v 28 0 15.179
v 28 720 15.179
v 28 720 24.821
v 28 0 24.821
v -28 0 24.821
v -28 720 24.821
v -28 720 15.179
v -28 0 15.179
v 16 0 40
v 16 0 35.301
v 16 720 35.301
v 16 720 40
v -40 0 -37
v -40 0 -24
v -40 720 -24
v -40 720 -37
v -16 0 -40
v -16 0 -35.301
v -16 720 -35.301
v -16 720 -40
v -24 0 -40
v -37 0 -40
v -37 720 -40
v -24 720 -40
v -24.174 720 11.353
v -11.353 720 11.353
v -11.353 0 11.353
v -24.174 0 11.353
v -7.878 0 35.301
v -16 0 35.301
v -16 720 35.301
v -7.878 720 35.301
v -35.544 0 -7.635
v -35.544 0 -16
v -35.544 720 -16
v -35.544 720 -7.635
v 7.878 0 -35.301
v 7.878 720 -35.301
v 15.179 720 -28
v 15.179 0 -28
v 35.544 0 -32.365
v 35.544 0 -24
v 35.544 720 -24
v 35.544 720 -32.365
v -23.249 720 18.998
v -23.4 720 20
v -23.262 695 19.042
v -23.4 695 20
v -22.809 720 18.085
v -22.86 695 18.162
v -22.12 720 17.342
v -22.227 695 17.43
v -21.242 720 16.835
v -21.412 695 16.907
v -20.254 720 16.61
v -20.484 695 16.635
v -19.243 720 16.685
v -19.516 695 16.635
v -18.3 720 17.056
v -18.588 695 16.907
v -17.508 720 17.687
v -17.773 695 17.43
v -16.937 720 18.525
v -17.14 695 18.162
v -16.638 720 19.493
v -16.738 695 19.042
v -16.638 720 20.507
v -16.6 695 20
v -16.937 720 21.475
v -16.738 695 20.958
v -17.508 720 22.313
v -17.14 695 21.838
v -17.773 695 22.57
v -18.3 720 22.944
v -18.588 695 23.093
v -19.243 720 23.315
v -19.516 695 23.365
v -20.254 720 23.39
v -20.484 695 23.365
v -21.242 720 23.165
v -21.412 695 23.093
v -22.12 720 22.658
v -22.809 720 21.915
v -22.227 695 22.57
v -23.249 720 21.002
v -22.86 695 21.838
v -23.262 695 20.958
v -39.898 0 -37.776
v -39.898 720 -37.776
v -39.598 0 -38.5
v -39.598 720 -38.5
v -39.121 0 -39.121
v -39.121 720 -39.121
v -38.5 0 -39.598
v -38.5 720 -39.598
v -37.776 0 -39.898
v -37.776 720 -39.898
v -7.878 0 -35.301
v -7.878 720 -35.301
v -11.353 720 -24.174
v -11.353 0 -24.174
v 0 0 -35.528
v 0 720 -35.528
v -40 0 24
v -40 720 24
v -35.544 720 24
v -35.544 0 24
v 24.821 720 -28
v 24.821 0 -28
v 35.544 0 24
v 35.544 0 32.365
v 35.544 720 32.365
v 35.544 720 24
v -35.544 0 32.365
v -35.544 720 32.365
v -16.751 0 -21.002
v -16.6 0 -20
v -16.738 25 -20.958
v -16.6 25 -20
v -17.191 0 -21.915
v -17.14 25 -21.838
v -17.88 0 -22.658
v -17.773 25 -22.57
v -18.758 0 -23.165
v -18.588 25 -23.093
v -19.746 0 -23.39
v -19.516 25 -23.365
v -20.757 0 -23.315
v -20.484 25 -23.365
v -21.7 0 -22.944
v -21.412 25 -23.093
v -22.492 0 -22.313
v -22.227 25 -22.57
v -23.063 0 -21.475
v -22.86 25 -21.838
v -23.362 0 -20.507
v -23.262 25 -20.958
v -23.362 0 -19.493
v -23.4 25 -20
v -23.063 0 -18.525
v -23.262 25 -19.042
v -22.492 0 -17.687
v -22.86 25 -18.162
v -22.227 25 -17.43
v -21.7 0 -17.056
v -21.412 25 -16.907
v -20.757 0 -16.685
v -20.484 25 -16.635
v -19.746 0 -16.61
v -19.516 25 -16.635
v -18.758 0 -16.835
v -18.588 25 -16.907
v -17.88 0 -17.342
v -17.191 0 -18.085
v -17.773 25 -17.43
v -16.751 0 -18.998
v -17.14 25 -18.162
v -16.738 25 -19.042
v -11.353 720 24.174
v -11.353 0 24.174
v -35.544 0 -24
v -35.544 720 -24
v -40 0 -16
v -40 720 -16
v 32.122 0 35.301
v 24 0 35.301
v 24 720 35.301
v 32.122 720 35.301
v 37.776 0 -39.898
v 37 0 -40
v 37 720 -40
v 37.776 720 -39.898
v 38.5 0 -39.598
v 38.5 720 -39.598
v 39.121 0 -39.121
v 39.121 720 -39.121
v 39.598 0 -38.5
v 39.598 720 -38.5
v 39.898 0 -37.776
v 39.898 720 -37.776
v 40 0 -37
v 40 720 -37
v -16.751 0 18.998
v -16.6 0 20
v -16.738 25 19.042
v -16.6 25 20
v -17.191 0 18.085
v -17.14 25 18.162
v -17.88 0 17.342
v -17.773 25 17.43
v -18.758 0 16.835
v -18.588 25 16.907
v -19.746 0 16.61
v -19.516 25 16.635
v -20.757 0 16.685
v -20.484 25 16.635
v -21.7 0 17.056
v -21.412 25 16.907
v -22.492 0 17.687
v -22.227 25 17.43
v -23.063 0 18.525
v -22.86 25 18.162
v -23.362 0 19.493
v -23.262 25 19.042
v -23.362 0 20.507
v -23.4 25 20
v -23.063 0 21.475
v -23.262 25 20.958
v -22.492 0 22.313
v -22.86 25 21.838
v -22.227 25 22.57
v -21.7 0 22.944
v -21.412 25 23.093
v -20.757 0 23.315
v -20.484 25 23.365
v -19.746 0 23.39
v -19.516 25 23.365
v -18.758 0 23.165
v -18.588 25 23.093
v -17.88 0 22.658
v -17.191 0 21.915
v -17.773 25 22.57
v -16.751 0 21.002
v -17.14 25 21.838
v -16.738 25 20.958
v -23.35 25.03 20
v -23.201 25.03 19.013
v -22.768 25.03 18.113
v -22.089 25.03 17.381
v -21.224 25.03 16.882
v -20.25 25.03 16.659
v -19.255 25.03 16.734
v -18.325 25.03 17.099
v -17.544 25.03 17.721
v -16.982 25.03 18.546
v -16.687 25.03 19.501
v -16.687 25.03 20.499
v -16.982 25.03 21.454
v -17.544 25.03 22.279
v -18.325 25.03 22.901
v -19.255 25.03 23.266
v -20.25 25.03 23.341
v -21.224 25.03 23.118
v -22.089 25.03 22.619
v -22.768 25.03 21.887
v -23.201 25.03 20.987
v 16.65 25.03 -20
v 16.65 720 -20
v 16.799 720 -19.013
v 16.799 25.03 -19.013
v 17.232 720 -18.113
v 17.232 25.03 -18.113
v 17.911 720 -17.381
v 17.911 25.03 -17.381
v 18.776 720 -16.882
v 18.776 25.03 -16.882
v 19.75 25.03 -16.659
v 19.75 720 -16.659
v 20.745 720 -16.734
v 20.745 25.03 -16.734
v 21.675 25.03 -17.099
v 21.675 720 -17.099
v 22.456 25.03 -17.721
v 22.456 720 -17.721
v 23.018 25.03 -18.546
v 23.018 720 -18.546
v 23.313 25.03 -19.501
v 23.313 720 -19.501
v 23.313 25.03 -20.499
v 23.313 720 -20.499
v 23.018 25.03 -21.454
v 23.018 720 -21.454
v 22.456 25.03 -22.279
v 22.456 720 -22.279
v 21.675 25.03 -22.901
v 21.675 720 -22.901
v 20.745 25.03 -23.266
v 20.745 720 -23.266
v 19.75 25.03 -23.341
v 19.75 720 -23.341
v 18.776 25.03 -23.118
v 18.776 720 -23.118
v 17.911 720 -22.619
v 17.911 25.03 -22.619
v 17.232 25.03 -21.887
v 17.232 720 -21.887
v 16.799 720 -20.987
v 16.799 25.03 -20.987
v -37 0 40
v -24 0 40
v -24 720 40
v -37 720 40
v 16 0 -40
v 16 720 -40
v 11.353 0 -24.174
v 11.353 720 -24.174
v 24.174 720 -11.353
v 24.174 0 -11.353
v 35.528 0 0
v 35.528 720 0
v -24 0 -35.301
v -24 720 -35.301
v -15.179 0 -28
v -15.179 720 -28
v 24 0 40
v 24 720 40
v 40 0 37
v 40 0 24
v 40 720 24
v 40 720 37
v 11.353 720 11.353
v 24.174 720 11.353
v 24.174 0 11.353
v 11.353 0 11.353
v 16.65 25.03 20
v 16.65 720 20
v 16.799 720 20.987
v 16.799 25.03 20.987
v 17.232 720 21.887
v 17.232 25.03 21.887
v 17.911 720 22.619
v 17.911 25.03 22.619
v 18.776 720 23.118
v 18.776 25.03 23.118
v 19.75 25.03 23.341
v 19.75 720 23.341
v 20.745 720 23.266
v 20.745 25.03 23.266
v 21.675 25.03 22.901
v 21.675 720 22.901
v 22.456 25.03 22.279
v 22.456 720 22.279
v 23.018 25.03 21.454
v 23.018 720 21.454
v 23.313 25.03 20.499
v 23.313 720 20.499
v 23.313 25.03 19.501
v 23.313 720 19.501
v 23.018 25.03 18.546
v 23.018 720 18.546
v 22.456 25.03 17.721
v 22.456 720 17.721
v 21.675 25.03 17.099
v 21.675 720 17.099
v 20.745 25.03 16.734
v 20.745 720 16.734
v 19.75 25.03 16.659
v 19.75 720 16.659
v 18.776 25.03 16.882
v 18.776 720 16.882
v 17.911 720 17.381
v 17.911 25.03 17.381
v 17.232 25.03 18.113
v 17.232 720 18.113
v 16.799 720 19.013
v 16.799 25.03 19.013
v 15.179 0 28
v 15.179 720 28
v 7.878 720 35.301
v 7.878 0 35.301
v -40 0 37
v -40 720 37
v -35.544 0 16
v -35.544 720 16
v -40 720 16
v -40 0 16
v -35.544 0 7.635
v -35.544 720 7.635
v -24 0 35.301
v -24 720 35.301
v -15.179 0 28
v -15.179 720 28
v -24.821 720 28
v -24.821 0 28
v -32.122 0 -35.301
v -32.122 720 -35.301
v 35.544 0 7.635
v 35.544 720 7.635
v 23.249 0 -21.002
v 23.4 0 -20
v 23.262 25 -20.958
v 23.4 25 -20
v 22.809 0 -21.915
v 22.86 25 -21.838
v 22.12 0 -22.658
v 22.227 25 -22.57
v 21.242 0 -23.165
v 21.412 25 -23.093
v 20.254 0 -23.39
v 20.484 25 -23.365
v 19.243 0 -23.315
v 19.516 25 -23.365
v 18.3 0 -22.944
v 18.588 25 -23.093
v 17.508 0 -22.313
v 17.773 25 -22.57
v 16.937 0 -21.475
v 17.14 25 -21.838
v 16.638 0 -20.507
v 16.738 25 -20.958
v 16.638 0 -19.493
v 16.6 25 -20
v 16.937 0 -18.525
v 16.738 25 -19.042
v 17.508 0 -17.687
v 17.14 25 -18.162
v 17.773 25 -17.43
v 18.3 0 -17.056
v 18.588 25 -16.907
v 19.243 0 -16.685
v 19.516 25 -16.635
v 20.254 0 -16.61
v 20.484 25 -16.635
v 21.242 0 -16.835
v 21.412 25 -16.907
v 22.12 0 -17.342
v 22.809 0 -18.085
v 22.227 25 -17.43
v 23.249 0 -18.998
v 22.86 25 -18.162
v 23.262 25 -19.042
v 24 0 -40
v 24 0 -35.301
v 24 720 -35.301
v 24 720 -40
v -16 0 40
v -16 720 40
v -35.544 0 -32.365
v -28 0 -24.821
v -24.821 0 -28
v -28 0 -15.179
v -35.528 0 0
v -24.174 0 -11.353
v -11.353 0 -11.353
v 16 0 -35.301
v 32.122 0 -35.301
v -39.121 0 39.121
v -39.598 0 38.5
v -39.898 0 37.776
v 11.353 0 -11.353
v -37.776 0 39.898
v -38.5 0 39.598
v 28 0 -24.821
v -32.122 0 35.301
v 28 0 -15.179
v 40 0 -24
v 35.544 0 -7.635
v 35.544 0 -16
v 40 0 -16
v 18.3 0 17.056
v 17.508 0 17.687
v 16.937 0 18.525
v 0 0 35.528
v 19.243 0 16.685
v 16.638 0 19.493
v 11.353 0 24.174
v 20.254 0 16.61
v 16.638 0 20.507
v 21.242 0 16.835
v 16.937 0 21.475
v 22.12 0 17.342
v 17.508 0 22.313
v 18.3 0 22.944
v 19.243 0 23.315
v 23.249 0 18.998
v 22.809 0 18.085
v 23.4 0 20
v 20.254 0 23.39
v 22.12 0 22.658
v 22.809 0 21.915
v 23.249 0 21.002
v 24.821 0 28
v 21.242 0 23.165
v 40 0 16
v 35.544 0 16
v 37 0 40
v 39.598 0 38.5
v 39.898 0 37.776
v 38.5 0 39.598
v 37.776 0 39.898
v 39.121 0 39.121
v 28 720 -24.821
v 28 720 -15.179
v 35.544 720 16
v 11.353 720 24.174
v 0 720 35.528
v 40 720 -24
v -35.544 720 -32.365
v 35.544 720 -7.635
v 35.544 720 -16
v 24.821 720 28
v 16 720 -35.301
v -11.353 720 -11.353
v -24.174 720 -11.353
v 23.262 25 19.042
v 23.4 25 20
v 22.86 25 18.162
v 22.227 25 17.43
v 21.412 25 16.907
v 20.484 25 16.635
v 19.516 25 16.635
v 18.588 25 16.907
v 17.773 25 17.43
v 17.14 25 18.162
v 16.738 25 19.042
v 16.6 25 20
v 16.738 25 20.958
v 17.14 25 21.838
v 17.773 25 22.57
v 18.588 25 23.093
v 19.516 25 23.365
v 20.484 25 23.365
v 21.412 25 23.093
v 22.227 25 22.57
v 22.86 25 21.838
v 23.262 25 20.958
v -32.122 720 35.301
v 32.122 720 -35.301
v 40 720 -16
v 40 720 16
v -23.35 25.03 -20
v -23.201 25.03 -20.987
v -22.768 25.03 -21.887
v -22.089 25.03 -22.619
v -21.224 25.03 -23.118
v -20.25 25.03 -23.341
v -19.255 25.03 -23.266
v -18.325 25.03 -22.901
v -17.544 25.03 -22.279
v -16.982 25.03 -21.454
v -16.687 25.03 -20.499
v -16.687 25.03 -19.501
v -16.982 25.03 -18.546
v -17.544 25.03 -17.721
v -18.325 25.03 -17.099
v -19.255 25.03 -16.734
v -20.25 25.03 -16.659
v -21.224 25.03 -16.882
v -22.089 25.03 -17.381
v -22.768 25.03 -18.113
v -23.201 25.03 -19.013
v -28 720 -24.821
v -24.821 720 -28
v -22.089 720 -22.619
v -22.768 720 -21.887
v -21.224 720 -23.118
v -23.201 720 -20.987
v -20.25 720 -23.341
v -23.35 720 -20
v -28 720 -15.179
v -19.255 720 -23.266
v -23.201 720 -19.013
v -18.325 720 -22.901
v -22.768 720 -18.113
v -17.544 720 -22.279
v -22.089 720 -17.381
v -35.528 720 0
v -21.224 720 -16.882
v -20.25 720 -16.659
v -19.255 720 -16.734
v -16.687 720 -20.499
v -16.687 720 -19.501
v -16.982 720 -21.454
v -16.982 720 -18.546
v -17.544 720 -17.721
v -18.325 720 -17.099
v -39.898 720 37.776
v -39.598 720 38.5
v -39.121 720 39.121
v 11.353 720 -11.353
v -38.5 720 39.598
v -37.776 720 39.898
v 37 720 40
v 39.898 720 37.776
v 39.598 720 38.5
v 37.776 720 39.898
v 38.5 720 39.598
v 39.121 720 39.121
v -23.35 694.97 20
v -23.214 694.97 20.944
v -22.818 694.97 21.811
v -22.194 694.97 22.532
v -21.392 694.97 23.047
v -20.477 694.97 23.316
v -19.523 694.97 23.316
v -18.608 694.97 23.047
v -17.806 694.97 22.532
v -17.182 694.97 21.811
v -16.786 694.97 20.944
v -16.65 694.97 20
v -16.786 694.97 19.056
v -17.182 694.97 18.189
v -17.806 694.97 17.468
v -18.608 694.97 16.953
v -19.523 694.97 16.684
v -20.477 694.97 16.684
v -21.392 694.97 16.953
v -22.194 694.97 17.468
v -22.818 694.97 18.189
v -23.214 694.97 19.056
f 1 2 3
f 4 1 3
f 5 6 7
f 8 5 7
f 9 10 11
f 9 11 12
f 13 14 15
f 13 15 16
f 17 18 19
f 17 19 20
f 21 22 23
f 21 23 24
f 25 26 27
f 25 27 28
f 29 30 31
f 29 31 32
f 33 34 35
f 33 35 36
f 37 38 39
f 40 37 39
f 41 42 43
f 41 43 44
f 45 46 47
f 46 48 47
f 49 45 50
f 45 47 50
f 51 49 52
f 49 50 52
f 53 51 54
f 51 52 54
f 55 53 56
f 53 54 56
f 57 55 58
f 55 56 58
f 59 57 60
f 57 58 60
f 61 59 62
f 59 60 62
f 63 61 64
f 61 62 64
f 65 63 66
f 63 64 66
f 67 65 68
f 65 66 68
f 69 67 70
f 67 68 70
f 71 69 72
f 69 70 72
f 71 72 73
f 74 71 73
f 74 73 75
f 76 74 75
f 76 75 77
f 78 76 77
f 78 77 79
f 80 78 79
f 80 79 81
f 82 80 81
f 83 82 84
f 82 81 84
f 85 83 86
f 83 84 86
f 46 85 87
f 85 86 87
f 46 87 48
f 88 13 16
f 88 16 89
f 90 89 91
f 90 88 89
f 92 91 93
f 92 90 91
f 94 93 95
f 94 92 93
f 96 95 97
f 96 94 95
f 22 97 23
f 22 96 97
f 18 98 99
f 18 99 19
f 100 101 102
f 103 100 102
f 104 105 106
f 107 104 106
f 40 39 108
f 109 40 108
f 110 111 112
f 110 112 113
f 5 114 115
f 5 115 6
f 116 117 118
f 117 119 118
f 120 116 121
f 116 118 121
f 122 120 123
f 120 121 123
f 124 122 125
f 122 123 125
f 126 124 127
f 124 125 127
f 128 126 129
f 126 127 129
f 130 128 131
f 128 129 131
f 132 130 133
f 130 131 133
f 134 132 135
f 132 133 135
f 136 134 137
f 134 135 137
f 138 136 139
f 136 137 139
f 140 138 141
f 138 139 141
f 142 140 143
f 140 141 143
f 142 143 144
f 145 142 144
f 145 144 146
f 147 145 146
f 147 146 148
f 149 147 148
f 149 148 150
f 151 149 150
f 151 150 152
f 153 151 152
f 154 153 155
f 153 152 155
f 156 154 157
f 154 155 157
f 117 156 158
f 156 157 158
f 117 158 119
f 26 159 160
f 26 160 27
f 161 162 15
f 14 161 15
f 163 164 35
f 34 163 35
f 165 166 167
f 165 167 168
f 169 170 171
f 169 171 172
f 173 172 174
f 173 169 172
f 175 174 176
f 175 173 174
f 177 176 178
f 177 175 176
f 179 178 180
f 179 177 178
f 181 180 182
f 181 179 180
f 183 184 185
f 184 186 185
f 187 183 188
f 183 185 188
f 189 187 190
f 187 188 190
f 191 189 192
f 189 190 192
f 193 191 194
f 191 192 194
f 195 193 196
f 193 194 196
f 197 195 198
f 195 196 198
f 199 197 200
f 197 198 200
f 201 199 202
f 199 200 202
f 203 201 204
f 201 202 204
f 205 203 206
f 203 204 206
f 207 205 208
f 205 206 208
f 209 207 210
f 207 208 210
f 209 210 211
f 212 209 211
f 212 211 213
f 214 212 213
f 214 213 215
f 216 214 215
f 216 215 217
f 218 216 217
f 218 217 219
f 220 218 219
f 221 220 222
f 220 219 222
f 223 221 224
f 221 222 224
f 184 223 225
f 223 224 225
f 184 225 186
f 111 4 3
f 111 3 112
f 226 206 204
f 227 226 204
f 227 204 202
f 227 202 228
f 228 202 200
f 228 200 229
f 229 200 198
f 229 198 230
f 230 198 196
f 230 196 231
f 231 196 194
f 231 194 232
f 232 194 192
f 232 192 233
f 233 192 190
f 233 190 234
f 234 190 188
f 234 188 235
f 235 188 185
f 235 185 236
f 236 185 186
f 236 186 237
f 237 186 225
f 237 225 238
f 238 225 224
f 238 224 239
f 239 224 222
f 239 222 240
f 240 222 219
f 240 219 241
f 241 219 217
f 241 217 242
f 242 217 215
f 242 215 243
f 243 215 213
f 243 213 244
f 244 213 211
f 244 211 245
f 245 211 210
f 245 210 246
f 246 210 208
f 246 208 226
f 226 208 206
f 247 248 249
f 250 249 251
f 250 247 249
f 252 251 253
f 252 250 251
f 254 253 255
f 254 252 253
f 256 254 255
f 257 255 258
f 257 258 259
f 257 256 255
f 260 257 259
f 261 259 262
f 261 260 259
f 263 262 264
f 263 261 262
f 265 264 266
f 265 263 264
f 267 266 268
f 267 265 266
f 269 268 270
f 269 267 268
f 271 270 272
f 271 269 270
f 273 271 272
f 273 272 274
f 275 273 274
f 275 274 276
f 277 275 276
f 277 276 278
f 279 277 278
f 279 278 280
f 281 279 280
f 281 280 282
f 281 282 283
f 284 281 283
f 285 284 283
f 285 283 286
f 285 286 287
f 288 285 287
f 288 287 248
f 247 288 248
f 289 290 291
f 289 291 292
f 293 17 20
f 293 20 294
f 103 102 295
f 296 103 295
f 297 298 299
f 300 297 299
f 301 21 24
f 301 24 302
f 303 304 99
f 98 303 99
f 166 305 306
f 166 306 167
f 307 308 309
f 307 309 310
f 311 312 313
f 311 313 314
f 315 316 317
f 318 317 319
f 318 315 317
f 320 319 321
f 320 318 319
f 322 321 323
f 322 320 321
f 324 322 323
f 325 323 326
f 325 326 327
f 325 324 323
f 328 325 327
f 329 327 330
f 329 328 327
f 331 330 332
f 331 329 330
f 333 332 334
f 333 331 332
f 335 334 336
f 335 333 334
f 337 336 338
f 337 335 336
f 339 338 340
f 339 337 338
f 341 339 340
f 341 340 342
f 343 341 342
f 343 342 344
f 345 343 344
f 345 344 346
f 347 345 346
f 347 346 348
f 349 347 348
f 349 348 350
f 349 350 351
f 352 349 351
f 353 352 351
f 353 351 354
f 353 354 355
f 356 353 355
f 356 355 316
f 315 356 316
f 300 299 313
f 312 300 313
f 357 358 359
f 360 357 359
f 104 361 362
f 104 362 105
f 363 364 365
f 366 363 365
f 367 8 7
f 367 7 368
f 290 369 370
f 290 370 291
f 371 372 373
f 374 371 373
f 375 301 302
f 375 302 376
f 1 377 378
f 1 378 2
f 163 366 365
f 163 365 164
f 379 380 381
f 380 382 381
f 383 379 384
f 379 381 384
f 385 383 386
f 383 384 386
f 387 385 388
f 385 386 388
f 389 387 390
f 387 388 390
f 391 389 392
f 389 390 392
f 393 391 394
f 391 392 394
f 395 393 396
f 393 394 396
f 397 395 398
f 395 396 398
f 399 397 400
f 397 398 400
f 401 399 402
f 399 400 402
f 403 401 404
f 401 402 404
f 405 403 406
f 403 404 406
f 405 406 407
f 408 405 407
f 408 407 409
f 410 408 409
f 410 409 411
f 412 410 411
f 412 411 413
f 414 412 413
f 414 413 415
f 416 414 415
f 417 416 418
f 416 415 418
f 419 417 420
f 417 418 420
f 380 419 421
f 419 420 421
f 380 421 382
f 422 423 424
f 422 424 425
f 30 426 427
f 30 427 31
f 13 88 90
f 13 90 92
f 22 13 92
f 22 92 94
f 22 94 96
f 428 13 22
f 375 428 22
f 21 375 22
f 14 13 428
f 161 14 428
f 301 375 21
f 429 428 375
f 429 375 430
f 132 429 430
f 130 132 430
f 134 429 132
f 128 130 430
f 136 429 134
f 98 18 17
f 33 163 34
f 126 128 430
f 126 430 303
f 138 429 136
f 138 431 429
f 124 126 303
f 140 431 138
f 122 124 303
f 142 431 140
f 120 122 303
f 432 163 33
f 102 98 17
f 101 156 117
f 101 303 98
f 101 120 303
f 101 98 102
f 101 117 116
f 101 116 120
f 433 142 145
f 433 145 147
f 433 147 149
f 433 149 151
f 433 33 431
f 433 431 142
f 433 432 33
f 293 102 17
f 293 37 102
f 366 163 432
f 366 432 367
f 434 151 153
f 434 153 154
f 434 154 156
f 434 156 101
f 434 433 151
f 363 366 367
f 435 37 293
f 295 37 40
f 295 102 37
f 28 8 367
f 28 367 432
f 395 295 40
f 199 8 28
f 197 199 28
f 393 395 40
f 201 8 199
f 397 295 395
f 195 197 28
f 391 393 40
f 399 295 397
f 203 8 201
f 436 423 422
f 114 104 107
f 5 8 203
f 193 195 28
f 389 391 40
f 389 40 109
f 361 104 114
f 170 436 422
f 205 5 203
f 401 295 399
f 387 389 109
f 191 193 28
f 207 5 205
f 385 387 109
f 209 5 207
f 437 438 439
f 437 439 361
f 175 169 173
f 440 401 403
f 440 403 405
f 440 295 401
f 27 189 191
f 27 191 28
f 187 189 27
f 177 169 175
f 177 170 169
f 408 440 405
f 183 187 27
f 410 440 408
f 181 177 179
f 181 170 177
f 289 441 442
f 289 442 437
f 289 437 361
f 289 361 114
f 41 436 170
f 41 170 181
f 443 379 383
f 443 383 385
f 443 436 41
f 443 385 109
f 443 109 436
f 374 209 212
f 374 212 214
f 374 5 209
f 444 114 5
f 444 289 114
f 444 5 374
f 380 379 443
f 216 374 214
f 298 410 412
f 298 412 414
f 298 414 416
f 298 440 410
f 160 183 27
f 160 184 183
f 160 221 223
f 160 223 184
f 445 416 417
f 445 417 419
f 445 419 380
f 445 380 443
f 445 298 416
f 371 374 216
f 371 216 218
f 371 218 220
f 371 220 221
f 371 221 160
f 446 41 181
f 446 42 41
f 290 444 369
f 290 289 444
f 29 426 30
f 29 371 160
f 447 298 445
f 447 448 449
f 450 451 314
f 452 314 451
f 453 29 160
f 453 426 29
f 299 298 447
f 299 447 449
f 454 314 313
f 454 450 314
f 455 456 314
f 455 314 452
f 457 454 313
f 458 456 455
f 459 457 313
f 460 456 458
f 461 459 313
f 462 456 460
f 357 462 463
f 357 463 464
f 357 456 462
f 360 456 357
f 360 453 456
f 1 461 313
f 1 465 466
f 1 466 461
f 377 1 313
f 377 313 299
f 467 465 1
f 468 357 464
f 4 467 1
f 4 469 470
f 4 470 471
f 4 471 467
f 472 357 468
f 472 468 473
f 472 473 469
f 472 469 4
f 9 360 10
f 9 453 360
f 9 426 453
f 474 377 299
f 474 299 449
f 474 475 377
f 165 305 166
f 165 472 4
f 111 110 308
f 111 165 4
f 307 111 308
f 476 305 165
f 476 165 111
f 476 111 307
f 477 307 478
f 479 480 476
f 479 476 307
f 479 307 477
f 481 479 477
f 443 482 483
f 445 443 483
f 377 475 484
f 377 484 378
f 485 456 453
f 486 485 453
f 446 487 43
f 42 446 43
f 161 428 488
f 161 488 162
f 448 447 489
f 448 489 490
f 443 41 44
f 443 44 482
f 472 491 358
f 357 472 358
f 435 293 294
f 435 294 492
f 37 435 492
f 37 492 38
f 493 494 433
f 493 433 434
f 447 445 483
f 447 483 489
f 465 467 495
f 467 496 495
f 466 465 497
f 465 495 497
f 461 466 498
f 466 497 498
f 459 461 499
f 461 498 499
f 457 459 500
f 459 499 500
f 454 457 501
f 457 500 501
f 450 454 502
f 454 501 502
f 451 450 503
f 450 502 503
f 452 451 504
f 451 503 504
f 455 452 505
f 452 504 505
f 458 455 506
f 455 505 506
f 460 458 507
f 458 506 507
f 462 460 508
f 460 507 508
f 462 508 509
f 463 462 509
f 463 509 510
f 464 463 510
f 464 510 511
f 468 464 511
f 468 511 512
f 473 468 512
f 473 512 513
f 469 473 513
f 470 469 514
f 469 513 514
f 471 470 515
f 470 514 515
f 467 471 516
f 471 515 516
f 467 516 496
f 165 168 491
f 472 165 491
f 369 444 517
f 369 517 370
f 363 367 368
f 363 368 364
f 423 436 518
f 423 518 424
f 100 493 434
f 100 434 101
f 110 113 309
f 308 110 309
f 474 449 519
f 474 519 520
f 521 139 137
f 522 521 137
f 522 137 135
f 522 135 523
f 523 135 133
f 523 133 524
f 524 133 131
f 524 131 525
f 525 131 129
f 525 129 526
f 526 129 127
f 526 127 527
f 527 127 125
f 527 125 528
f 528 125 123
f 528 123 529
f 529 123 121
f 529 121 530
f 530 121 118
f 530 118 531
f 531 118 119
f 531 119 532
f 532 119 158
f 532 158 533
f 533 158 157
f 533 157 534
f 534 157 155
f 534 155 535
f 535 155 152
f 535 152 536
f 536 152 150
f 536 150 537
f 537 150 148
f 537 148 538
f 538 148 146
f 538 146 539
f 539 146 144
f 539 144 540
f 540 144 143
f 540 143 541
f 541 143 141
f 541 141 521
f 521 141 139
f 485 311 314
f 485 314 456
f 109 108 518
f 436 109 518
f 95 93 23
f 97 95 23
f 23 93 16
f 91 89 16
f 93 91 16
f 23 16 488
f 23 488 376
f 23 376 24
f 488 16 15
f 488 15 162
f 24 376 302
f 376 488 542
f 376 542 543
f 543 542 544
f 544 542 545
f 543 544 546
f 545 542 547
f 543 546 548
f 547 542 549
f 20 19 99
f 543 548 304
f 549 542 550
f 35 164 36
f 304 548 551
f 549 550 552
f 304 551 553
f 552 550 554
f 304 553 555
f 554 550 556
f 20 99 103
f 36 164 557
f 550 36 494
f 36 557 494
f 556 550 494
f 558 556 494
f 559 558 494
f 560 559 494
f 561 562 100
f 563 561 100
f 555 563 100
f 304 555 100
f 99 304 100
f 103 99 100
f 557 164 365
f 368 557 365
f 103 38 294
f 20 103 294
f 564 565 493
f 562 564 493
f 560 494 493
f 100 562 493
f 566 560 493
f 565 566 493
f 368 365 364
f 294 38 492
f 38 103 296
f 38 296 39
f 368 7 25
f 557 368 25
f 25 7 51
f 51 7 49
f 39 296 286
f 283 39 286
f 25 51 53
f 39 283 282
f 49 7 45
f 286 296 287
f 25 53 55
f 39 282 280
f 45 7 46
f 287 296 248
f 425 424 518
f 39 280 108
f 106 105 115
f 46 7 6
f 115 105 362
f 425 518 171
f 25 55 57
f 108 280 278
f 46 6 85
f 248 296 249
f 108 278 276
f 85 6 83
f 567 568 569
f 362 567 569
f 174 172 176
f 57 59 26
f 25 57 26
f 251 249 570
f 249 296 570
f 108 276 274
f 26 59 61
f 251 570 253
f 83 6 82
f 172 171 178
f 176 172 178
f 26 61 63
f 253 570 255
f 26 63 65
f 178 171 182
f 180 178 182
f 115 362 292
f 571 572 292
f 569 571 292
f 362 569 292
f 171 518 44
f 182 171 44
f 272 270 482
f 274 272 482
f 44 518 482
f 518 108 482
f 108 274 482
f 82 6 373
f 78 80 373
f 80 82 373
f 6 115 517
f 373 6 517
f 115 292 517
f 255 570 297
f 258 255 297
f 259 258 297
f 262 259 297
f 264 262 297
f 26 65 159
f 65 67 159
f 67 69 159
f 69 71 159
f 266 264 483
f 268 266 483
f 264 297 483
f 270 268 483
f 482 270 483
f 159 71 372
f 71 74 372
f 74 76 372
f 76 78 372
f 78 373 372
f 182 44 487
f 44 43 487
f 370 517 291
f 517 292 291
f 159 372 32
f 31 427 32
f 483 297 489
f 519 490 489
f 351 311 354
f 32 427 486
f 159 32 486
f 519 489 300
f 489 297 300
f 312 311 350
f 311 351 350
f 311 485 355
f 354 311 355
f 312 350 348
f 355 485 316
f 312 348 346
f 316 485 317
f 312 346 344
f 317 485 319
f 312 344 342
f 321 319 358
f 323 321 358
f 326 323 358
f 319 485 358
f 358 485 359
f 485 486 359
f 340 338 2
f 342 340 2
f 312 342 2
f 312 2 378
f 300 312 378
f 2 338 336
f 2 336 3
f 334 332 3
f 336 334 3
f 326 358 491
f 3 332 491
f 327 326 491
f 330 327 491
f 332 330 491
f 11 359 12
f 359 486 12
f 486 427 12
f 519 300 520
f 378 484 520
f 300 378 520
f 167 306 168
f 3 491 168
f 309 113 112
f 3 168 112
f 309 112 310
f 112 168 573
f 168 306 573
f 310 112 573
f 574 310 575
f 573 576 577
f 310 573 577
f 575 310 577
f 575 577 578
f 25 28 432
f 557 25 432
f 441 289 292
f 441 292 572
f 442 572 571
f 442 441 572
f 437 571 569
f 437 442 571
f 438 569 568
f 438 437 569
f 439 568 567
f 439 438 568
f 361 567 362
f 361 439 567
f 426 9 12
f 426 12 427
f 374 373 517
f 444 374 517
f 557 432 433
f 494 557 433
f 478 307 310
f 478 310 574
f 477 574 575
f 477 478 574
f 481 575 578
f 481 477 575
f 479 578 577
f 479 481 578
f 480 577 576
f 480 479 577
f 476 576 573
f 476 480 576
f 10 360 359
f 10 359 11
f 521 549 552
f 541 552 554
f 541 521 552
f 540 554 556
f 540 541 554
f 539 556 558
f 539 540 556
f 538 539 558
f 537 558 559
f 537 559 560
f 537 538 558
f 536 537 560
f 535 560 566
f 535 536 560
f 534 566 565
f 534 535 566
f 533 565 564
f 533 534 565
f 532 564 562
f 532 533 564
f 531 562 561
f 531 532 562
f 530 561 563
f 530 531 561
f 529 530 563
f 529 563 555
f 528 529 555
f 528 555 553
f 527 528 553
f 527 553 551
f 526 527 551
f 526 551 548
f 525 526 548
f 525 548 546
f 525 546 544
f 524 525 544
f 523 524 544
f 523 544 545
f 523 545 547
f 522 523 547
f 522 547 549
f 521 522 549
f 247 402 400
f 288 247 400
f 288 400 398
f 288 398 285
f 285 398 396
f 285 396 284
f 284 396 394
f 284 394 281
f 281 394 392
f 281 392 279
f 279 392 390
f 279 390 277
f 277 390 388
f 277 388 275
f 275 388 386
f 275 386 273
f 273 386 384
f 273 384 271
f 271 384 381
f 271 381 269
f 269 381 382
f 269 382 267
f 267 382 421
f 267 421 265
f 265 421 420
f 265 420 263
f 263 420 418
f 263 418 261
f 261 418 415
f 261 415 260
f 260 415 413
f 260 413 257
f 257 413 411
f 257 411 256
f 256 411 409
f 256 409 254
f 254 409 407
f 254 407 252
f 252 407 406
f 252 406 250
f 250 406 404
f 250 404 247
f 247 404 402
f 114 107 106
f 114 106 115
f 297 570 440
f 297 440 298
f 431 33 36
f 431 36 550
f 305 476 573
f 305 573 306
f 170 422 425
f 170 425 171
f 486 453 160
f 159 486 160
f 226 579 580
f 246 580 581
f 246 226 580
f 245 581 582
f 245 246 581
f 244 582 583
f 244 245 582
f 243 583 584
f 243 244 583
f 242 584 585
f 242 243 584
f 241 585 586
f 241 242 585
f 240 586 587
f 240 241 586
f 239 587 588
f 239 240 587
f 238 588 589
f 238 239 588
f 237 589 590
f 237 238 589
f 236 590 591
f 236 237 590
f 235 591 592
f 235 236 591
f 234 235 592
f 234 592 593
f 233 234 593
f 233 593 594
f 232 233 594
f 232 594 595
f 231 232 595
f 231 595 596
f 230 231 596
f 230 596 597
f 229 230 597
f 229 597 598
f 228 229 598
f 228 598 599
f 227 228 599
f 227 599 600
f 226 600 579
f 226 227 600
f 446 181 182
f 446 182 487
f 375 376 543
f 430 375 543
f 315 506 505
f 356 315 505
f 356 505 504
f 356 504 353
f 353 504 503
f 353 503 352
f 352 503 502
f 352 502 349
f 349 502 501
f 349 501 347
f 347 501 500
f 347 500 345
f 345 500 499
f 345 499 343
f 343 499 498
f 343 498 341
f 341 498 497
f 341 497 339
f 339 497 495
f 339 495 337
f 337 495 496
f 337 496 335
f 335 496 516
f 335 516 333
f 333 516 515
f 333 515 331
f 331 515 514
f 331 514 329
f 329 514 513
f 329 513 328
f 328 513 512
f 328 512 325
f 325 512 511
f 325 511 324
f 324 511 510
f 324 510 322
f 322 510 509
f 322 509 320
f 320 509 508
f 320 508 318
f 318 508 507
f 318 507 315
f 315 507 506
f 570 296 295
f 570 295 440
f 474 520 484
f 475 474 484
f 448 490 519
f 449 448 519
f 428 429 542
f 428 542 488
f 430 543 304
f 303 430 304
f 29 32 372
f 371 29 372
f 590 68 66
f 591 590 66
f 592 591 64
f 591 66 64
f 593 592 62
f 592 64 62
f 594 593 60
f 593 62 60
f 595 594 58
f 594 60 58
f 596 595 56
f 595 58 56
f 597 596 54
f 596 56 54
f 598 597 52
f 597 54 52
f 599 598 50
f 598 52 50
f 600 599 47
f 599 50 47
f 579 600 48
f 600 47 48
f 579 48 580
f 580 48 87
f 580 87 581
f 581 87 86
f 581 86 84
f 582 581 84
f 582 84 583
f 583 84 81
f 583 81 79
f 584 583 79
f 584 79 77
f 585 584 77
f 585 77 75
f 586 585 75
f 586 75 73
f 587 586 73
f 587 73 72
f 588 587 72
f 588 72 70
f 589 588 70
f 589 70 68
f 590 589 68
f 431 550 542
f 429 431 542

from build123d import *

# Parameters (mm, degrees)
SKETCH2_R                           = 3.35
F_80_SERIES_TS80_80M_650039_2_DEPTH = 720
M8X1_25_TAPPED_HOLE2_D              = 6.8
M8X1_25_TAPPED_HOLE2_DEPTH          = 25
M8X1_25_TAPPED_HOLE2_TIP            = 2.042926105
M8X1_25_TAPPED_HOLE3_D              = 6.8
M8X1_25_TAPPED_HOLE3_DEPTH          = 25
M8X1_25_TAPPED_HOLE3_TIP            = 2.042926105


with BuildPart() as part:
    # Sketch2 → 80 series TS80-80M-650039(2) (new body)
    with BuildSketch(Plane(origin=(0, 0, 0), x_dir=(-1, 0, 0), z_dir=(0, 1, 0))):
        with BuildLine():
            Line((-28, 15.179010667), (-28, 24.820989333))
            Line((-28, 24.820989333), (-35.5438, 32.364789333))
            Line((-35.5438, 32.364789333), (-35.5438, 24))
            Line((-35.5438, 24), (-40, 24))
            Line((-40, 24), (-40, 37))
            ThreePointArc((-40, 37), (-39.121320344, 39.121320344), (-37, 40))
            Line((-37, 40), (-24, 40))
            Line((-24, 40), (-24, 35.301))
            Line((-24, 35.301), (-32.121989333, 35.301))
            Line((-32.121989333, 35.301), (-24.820989333, 28))
            Line((-24.820989333, 28), (-15.179010667, 28))
            Line((-15.179010667, 28), (-7.878010667, 35.301))
            Line((-7.878010667, 35.301), (-16, 35.301))
            Line((-16, 35.301), (-16, 40))
            Line((-16, 40), (16, 40))
            Line((16, 40), (16, 35.301))
            Line((16, 35.301), (7.878010667, 35.301))
            Line((7.878010667, 35.301), (15.179010667, 28))
            Line((15.179010667, 28), (24.820989333, 28))
            Line((24.820989333, 28), (32.121989333, 35.301))
            Line((32.121989333, 35.301), (24, 35.301))
            Line((24, 35.301), (24, 40))
            Line((24, 40), (37, 40))
            ThreePointArc((37, 40), (39.121320344, 39.121320344), (40, 37))
            Line((40, 37), (40, 24))
            Line((40, 24), (35.5438, 24))
            Line((35.5438, 24), (35.5438, 32.364789333))
            Line((35.5438, 32.364789333), (28, 24.820989333))
            Line((28, 24.820989333), (28, 15.179010667))
            Line((28, 15.179010667), (35.5438, 7.635210667))
            Line((35.5438, 7.635210667), (35.5438, 16))
            Line((35.5438, 16), (40, 16))
            Line((40, 16), (40, -16))
            Line((40, -16), (35.5438, -16))
            Line((35.5438, -16), (35.5438, -7.635210667))
            Line((35.5438, -7.635210667), (28, -15.179010667))
            Line((28, -15.179010667), (28, -24.820989333))
            Line((28, -24.820989333), (35.5438, -32.364789333))
            Line((35.5438, -32.364789333), (35.5438, -24))
            Line((35.5438, -24), (40, -24))
            Line((40, -24), (40, -37))
            ThreePointArc((40, -37), (39.121320344, -39.121320344), (37, -40))
            Line((37, -40), (24, -40))
            Line((24, -40), (24, -35.301))
            Line((24, -35.301), (32.121989333, -35.301))
            Line((32.121989333, -35.301), (24.820989333, -28))
            Line((24.820989333, -28), (15.179010667, -28))
            Line((15.179010667, -28), (7.878010667, -35.301))
            Line((7.878010667, -35.301), (16, -35.301))
            Line((16, -35.301), (16, -40))
            Line((16, -40), (-16, -40))
            Line((-16, -40), (-16, -35.301))
            Line((-16, -35.301), (-7.878010667, -35.301))
            Line((-7.878010667, -35.301), (-15.179010667, -28))
            Line((-15.179010667, -28), (-24.820989333, -28))
            Line((-24.820989333, -28), (-32.121989333, -35.301))
            Line((-32.121989333, -35.301), (-24, -35.301))
            Line((-24, -35.301), (-24, -40))
            Line((-24, -40), (-37, -40))
            ThreePointArc((-37, -40), (-39.121320344, -39.121320344), (-40, -37))
            Line((-40, -37), (-40, -24))
            Line((-40, -24), (-35.5438, -24))
            Line((-35.5438, -24), (-35.5438, -32.364789333))
            Line((-35.5438, -32.364789333), (-28, -24.820989333))
            Line((-28, -24.820989333), (-28, -15.179010667))
            Line((-28, -15.179010667), (-35.5438, -7.635210667))
            Line((-35.5438, -7.635210667), (-35.5438, -16))
            Line((-35.5438, -16), (-40, -16))
            Line((-40, -16), (-40, 16))
            Line((-40, 16), (-35.5438, 16))
            Line((-35.5438, 16), (-35.5438, 7.635210667))
            Line((-35.5438, 7.635210667), (-28, 15.179010667))
        make_face()
        with Locations((20, -20)):
            Circle(SKETCH2_R, mode=Mode.SUBTRACT)
        with Locations((-20, -20)):
            Circle(SKETCH2_R, mode=Mode.SUBTRACT)
        with Locations((-20, 20)):
            Circle(SKETCH2_R, mode=Mode.SUBTRACT)
        with Locations((20, 20)):
            Circle(SKETCH2_R, mode=Mode.SUBTRACT)
        Polygon((-11.353421559, 24.174410892), (0, 35.527832452), (11.353421559, 24.174410892), (11.353421559, 11.353421559), (24.174410892, 11.353421559), (35.527832452, 0), (24.174410892, -11.353421559), (11.353421559, -11.353421559), (11.353421559, -24.174410892), (0, -35.527832452), (-11.353421559, -24.174410892), (-11.353421559, -11.353421559), (-24.174410892, -11.353421559), (-35.527832452, 0), (-24.174410892, 11.353421559), (-11.353421559, 11.353421559), align=None, mode=Mode.SUBTRACT)
    extrude(amount=F_80_SERIES_TS80_80M_650039_2_DEPTH)

    # M8x1.25 Tapped Hole2
    with Locations(Plane(origin=(0, 0, 0), x_dir=(-1, 0, 0), z_dir=(0, -1, 0))):
        with Locations((-20, 20), (20, 20), (20, -20), (-20, -20)):
            Hole(M8X1_25_TAPPED_HOLE2_D / 2, depth=M8X1_25_TAPPED_HOLE2_DEPTH)
            with Locations((0, 0, -(M8X1_25_TAPPED_HOLE2_DEPTH + M8X1_25_TAPPED_HOLE2_TIP / 2))):  # 118° drill point
                Cone(0, M8X1_25_TAPPED_HOLE2_D / 2, M8X1_25_TAPPED_HOLE2_TIP, mode=Mode.SUBTRACT)

    # M8x1.25 Tapped Hole3
    with Locations(Plane(origin=(0, 720, 0), x_dir=(1, 0, 0), z_dir=(0, 1, 0))):
        with Locations((-20, -20)):
            Hole(M8X1_25_TAPPED_HOLE3_D / 2, depth=M8X1_25_TAPPED_HOLE3_DEPTH)
            with Locations((0, 0, -(M8X1_25_TAPPED_HOLE3_DEPTH + M8X1_25_TAPPED_HOLE3_TIP / 2))):  # 118° drill point
                Cone(0, M8X1_25_TAPPED_HOLE3_D / 2, M8X1_25_TAPPED_HOLE3_TIP, mode=Mode.SUBTRACT)


solid = part.part
